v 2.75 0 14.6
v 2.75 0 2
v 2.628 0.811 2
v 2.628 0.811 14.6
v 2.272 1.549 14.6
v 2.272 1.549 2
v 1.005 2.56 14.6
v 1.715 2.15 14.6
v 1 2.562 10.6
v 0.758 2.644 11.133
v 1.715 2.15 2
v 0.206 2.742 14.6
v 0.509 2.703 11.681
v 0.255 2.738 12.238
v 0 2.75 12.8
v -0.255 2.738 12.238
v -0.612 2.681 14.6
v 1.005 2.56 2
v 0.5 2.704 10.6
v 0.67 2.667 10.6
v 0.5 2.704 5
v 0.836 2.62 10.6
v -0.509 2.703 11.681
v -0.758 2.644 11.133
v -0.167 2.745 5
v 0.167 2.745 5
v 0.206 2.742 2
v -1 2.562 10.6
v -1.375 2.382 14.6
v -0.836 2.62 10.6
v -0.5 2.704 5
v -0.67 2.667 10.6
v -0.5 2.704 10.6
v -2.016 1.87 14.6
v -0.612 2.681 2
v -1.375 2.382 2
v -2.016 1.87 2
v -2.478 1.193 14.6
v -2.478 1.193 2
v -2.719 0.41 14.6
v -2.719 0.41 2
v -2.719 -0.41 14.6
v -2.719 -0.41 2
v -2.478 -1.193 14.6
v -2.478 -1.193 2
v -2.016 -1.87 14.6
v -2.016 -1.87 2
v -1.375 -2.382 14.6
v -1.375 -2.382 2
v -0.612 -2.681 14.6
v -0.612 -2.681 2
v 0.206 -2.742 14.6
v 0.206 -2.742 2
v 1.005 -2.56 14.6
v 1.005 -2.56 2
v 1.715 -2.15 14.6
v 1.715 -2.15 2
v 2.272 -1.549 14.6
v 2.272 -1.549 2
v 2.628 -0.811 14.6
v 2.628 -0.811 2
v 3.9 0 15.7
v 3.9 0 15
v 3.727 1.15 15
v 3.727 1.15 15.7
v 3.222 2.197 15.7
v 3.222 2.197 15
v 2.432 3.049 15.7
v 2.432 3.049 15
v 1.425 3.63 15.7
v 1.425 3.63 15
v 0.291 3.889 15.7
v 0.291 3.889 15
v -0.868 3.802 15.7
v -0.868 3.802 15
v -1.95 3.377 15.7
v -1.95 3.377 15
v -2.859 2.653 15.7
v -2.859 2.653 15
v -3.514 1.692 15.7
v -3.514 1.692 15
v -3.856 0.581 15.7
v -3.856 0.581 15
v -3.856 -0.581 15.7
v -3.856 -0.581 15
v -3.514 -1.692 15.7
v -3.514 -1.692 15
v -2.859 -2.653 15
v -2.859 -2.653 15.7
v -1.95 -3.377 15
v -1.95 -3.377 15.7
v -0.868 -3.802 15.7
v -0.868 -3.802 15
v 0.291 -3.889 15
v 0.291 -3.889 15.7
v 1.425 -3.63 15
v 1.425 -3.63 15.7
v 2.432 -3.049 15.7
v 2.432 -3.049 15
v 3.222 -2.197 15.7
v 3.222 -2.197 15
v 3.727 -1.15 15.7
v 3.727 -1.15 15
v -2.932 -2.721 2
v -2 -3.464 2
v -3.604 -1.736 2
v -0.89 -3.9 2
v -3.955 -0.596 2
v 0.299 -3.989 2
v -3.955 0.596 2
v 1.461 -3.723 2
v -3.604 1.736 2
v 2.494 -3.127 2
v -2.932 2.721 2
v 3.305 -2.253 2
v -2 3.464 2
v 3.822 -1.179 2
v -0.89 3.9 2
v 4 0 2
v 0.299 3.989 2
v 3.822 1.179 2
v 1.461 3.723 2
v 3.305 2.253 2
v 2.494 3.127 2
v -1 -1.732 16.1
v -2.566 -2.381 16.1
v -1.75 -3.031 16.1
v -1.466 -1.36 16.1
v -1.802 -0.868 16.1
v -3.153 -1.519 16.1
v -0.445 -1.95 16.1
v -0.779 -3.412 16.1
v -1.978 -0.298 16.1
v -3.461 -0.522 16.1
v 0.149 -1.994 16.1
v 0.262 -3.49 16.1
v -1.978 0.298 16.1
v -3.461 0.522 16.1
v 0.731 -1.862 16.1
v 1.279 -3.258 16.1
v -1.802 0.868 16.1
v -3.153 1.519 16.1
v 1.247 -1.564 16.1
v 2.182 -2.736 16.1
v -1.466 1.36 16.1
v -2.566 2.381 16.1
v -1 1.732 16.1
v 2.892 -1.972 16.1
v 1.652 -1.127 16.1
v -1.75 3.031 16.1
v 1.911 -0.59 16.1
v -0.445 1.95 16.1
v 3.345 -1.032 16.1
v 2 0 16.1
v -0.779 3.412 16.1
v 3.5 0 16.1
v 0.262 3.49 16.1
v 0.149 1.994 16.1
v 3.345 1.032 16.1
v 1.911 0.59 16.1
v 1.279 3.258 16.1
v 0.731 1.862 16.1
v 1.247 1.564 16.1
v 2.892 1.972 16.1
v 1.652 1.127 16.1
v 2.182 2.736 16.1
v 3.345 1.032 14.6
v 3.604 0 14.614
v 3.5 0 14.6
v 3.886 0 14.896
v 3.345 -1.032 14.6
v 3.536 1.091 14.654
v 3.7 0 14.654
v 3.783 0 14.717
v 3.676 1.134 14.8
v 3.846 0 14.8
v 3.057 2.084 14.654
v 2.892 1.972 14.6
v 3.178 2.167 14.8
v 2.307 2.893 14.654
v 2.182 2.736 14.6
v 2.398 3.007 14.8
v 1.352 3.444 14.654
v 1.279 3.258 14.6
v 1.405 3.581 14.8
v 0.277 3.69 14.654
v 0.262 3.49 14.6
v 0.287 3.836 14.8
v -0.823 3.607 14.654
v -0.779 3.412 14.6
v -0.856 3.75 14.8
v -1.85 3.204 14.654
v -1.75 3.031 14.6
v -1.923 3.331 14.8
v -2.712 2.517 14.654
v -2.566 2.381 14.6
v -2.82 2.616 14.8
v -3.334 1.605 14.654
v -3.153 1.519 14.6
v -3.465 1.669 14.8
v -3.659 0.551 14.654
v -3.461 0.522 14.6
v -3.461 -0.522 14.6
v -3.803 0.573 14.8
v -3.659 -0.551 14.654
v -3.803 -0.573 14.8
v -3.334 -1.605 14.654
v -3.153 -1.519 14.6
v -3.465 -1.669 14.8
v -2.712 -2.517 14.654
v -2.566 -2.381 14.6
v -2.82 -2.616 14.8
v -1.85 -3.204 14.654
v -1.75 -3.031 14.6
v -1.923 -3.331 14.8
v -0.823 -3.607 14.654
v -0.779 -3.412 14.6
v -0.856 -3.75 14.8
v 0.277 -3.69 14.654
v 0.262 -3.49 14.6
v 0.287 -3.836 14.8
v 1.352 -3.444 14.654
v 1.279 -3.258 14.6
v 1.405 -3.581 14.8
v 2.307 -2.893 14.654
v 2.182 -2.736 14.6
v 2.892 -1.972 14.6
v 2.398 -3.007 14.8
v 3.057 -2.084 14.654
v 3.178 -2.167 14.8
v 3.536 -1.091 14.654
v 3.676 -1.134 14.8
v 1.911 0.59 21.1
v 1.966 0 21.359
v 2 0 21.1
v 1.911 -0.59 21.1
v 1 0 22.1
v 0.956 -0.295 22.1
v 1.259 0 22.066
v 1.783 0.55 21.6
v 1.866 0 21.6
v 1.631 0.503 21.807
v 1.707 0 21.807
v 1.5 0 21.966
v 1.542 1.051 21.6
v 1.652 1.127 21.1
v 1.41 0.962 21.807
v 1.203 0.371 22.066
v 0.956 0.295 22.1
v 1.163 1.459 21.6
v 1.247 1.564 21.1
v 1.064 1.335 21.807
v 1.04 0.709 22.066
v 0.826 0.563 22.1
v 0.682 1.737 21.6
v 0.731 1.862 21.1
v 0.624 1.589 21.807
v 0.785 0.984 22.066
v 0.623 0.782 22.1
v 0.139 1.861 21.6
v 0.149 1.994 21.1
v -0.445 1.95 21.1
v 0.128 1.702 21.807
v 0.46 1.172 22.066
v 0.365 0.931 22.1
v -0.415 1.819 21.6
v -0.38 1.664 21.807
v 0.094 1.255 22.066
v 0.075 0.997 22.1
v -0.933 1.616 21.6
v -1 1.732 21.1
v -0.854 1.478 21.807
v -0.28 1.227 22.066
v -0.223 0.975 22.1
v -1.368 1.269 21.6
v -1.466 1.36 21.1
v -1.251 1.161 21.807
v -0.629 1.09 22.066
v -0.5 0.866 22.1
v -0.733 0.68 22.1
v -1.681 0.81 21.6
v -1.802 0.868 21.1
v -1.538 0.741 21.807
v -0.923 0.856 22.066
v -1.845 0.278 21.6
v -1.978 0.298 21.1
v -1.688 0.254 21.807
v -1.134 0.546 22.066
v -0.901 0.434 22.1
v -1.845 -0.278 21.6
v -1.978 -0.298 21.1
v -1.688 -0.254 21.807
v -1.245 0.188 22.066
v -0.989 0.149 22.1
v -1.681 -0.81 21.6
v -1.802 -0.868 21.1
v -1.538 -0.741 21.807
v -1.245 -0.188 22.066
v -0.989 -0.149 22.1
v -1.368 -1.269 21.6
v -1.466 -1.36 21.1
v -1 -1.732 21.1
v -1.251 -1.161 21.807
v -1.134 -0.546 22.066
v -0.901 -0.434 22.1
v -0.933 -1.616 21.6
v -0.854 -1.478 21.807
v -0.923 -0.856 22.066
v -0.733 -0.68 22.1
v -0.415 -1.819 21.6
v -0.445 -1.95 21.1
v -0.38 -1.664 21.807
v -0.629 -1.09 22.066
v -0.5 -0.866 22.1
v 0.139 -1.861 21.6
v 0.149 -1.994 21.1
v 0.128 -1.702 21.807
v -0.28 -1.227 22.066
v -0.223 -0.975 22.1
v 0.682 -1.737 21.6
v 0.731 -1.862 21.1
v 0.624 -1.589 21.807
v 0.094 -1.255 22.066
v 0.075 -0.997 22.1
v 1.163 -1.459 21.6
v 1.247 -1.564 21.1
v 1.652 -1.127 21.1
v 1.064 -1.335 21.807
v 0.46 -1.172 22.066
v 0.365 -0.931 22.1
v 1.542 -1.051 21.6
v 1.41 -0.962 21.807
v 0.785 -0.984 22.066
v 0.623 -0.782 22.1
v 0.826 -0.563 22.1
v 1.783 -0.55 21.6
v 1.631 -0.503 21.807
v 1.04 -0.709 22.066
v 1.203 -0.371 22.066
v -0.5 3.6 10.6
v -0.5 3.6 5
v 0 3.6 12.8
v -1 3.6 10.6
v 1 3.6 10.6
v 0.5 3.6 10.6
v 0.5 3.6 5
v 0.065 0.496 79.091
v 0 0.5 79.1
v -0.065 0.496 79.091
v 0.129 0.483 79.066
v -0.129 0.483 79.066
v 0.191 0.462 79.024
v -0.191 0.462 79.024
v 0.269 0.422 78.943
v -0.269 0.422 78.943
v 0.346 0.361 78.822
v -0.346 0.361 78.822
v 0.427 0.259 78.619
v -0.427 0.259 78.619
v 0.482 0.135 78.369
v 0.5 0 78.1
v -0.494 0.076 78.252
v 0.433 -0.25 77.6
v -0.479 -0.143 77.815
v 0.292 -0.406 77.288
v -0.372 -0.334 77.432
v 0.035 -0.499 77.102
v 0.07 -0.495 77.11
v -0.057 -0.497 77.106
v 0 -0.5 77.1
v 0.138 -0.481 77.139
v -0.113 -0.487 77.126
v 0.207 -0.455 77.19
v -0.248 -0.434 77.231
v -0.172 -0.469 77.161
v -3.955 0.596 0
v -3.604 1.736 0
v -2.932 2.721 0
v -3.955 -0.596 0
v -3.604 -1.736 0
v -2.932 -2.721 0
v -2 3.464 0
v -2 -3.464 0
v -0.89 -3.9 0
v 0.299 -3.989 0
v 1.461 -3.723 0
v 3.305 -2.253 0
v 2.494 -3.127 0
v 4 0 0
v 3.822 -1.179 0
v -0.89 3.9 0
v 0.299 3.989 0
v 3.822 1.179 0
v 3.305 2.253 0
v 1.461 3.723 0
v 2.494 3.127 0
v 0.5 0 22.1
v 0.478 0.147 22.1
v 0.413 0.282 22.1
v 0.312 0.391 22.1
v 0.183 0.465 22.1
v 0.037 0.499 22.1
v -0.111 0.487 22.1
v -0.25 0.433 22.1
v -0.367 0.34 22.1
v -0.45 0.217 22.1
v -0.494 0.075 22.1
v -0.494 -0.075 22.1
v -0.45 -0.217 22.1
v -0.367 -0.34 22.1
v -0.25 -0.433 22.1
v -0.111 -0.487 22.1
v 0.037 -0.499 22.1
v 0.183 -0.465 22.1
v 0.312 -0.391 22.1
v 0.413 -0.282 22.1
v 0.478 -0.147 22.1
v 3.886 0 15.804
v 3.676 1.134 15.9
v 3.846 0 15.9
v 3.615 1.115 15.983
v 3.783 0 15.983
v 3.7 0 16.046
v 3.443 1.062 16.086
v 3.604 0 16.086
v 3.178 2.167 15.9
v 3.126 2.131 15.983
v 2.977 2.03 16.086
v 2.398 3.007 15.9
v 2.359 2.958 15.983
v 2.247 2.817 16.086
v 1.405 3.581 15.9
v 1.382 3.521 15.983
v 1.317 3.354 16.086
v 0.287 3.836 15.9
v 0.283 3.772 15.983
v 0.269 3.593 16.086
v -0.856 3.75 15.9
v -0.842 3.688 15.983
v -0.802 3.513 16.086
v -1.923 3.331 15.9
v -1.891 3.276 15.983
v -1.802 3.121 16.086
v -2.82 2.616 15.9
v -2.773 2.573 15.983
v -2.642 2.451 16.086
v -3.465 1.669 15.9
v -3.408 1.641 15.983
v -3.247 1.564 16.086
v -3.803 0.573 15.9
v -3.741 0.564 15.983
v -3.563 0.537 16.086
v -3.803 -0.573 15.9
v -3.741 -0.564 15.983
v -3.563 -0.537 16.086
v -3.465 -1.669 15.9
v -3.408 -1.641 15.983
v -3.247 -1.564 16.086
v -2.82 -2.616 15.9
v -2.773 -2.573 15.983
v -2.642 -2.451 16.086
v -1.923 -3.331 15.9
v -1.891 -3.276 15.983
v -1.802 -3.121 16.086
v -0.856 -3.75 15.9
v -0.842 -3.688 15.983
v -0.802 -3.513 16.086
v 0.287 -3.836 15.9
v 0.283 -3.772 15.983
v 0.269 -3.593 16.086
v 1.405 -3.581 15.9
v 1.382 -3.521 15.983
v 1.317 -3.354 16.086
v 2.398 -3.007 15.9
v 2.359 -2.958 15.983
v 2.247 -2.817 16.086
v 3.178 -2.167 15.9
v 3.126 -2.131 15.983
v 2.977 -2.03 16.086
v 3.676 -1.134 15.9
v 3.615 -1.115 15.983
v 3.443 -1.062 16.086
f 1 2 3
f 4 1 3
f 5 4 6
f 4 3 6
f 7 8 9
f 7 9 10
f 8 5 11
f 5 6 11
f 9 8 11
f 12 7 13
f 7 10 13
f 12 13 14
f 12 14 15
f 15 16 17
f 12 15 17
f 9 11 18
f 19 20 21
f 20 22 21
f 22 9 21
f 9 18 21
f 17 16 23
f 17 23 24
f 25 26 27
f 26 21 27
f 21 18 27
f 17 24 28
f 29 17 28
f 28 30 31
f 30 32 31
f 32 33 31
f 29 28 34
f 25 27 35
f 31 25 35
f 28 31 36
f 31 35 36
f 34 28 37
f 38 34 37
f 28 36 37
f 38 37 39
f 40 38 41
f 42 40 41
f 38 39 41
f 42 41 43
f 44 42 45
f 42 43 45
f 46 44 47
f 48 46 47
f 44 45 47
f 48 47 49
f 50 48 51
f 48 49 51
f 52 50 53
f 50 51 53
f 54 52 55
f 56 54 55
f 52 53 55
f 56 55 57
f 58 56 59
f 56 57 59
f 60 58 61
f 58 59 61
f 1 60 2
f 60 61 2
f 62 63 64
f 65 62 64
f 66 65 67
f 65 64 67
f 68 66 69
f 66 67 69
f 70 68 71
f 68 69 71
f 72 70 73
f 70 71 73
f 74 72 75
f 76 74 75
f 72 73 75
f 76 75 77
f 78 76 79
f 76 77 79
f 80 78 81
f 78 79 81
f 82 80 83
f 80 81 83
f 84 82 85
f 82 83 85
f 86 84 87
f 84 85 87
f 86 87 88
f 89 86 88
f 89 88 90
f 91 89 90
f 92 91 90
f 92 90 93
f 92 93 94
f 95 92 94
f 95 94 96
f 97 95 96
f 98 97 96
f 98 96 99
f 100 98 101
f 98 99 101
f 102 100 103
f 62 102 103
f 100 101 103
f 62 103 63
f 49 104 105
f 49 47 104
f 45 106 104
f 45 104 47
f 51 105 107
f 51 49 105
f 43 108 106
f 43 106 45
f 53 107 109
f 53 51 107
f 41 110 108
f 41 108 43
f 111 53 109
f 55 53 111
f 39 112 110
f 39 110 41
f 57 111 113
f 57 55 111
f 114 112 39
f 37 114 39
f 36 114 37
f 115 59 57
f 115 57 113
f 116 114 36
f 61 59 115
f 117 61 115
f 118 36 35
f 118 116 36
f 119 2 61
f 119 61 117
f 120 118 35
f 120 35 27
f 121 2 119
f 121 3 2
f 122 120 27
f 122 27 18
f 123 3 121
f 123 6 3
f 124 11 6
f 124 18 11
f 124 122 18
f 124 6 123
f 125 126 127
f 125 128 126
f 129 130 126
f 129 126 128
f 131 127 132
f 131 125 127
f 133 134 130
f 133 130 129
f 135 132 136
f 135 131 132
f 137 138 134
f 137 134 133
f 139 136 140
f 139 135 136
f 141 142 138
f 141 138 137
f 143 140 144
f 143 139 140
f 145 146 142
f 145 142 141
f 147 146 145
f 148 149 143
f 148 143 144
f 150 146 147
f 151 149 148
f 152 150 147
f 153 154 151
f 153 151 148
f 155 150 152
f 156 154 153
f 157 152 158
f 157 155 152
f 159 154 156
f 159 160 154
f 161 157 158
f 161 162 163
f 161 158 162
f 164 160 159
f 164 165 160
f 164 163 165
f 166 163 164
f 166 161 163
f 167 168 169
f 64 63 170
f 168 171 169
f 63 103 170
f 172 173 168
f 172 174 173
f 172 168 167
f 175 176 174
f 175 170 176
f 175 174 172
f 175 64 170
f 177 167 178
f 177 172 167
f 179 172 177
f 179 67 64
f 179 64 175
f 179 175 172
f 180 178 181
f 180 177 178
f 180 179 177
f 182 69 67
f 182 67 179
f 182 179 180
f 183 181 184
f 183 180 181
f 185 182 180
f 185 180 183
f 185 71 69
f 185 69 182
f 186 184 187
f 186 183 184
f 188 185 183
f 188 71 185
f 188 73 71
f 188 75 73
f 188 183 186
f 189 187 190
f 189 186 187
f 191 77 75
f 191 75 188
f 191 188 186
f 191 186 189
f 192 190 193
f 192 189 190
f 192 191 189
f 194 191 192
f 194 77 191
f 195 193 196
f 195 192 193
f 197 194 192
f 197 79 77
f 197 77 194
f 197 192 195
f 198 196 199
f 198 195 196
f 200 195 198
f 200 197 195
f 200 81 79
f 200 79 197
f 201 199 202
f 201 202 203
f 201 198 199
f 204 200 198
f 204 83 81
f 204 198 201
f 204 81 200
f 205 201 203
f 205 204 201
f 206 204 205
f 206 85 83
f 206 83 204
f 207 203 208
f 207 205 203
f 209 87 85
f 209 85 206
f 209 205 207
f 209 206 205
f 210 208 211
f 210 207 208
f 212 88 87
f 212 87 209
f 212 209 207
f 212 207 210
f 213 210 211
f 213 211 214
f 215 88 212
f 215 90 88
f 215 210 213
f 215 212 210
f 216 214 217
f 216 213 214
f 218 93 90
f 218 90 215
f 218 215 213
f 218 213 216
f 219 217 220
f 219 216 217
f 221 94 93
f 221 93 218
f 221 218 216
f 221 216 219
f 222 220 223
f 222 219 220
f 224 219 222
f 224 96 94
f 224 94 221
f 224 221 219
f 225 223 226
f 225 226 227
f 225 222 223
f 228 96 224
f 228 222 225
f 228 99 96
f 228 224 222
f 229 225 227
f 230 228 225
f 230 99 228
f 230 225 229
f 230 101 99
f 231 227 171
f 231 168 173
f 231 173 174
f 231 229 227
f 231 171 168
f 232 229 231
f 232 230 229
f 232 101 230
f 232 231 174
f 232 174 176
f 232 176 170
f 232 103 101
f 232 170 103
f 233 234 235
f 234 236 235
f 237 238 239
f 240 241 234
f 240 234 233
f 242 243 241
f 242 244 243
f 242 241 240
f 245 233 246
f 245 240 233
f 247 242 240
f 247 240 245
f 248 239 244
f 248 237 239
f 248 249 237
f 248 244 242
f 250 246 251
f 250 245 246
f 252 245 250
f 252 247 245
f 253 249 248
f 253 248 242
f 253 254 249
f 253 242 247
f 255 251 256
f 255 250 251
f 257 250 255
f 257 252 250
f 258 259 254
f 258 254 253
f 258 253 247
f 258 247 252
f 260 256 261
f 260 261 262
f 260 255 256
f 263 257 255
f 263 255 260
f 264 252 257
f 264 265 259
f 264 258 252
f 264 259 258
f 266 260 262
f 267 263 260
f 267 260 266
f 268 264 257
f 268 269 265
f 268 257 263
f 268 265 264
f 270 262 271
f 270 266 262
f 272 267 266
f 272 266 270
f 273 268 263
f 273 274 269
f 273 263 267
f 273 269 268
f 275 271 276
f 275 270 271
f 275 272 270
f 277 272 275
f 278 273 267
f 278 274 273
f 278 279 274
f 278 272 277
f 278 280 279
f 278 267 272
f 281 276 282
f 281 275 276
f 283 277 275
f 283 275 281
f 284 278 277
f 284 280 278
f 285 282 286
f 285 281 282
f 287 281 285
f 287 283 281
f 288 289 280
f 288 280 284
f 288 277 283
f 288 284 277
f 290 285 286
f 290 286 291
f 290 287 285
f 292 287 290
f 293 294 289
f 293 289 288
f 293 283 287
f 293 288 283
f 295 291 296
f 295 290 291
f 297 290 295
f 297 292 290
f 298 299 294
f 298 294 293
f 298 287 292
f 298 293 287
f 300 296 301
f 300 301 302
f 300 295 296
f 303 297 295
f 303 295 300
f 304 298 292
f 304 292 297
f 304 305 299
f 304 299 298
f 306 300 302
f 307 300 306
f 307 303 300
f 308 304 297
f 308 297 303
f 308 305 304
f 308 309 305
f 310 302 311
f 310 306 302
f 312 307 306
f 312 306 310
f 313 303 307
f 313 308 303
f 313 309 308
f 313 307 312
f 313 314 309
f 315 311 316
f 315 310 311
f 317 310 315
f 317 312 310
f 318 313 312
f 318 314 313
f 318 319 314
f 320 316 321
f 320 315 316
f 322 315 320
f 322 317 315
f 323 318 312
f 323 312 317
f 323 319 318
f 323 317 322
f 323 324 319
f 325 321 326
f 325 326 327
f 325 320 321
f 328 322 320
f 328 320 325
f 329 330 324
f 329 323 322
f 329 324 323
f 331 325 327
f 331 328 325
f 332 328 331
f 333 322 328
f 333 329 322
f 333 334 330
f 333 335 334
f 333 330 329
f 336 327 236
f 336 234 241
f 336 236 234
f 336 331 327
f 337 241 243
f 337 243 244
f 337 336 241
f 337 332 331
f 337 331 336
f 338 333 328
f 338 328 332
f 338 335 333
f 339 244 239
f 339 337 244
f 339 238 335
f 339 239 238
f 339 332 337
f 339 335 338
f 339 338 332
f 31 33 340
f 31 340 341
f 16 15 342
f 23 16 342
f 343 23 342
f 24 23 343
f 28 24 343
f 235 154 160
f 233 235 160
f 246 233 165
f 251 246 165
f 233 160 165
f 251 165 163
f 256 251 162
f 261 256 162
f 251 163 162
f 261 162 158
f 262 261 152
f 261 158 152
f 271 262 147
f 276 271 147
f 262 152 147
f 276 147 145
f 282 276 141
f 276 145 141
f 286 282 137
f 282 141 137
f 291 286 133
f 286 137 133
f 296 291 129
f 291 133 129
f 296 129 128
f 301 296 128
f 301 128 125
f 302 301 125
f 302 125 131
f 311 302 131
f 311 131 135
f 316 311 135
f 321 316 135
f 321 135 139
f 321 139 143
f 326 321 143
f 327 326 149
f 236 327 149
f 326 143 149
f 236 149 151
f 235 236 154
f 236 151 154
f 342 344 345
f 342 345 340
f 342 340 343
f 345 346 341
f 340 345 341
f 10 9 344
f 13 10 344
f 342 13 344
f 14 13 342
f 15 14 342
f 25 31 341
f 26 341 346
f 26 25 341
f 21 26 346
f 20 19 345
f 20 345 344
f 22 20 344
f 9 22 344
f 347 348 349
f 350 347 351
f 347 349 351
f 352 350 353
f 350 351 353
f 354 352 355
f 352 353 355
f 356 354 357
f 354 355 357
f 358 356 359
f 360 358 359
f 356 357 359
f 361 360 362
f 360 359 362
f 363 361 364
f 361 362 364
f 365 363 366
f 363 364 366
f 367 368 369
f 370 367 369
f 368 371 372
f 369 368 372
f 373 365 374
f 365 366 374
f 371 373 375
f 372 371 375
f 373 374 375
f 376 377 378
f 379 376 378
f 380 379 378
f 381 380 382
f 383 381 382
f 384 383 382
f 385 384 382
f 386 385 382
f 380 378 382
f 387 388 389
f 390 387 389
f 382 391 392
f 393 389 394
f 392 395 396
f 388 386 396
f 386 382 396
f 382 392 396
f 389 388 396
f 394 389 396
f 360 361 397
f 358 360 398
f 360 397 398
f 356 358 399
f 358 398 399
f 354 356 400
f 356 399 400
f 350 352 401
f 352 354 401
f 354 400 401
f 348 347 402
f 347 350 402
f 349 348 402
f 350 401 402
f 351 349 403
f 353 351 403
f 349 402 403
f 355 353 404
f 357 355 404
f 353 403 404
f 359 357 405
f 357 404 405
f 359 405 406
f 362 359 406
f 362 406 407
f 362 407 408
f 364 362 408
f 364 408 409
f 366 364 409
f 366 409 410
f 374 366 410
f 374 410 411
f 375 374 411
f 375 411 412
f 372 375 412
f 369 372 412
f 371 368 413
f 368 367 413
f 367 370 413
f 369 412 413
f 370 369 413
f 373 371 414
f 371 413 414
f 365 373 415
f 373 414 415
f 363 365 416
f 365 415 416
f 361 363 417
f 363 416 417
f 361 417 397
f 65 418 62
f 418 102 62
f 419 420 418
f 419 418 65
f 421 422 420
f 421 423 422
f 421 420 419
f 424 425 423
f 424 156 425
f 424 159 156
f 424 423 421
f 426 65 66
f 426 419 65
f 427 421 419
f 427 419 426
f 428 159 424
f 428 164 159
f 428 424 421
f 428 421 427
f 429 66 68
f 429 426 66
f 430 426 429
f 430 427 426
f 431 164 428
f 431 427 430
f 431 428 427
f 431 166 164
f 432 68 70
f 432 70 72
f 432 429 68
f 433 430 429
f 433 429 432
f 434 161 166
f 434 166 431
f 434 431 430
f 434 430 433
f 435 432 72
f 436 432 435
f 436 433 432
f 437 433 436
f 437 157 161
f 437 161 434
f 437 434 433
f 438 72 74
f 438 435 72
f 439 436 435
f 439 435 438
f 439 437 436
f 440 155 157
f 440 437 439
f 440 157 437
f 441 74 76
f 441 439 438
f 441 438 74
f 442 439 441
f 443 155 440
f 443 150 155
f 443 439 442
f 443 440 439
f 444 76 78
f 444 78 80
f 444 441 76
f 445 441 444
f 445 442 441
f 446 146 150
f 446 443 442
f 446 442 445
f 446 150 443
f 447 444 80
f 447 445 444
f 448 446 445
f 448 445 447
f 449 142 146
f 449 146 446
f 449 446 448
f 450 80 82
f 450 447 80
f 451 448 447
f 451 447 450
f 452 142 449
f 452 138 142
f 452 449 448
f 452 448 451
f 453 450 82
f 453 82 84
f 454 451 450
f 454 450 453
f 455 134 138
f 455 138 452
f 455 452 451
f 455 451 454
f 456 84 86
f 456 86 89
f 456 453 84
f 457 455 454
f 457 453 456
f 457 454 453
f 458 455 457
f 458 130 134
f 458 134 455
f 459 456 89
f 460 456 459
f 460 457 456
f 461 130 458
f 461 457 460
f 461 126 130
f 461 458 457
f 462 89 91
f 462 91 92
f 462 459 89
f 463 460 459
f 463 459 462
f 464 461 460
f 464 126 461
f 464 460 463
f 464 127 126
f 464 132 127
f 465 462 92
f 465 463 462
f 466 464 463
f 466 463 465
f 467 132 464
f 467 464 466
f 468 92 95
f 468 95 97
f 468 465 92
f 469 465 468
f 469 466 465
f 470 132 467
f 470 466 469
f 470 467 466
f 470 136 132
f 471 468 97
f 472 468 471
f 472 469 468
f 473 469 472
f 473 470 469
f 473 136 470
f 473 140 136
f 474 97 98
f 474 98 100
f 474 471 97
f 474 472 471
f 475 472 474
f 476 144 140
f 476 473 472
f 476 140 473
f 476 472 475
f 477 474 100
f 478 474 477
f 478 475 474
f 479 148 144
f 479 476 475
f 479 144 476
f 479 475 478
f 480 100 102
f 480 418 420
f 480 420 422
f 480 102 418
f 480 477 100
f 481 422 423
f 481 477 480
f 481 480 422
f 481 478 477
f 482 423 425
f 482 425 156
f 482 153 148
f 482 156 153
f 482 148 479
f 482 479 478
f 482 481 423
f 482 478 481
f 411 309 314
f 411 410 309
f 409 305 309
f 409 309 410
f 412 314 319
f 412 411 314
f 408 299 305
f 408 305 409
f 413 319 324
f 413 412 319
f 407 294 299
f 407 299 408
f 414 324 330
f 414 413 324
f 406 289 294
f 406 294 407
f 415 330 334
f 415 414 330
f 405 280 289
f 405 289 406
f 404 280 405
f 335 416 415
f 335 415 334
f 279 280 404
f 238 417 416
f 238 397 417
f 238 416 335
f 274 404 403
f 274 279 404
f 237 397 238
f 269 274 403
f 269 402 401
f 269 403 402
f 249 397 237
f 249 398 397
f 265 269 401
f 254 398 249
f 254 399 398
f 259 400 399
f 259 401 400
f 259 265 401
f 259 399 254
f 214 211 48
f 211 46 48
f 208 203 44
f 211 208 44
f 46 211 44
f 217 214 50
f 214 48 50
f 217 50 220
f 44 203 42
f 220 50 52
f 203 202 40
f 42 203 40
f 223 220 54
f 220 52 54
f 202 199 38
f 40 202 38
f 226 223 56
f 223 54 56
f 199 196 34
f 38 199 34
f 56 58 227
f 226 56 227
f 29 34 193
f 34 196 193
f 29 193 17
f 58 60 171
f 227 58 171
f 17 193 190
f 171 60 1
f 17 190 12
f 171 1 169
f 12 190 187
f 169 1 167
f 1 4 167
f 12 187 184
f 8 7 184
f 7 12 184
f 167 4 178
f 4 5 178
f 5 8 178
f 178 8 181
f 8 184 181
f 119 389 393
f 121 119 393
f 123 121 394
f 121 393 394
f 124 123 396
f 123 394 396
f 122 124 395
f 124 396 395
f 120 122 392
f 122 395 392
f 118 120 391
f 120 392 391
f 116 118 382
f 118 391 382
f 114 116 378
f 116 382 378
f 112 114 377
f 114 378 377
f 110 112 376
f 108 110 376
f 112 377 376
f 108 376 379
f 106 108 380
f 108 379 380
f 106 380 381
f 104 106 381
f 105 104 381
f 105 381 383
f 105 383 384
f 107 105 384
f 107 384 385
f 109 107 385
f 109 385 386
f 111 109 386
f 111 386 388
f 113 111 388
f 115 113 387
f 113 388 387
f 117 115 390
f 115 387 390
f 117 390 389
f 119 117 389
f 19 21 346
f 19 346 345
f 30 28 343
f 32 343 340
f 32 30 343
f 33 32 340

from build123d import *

# Parameters (mm, degrees)
SKETCH1_R               = 4
BOSS_EXTRUDE1_DEPTH     = 2
SKETCH2_R               = 2.75
BOSS_EXTRUDE2_DEPTH     = 12.6
SKETCH3_R               = 3.9
BOSS_EXTRUDE3_DEPTH     = 1.5
SKETCH4_R               = 2
BOSS_EXTRUDE4_DEPTH     = 6
FILLET1_R               = 1
BOSS_EXTRUDE5_DEPTH     = 3.6
SKETCH6_R               = 0.5
BOSS_EXTRUDE6_DEPTH     = 57
CUT_EXTRUDE1_DEPTH      = 5
CUT_EXTRUDE1_DEPTH_BACK = 5
FILLET2_R               = 0.4


with BuildPart() as part:
    # Sketch1 → Boss-Extrude1 (new body)
    with BuildSketch(Plane.XY):
        Circle(SKETCH1_R)
    extrude(amount=BOSS_EXTRUDE1_DEPTH)

    # Sketch2 → Boss-Extrude2 (add)
    with BuildSketch(Plane.XY.offset(2)):
        Circle(SKETCH2_R)
    extrude(amount=BOSS_EXTRUDE2_DEPTH)

    # Sketch3 → Boss-Extrude3 (add)
    with BuildSketch(Plane.XY.offset(14.6)):
        Circle(SKETCH3_R)
    extrude(amount=BOSS_EXTRUDE3_DEPTH)

    # Sketch4 → Boss-Extrude4 (add)
    with BuildSketch(Plane.XY.offset(16.1)):
        Circle(SKETCH4_R)
    extrude(amount=BOSS_EXTRUDE4_DEPTH)

    # Fillet1
    fillet1_edges = [part.edges().sort_by_distance(p)[0] for p in [
        (-2, 0, 22.1),
    ]]
    fillet(fillet1_edges, radius=FILLET1_R)

    # Sketch5 → Boss-Extrude5 (add)
    with BuildSketch(Plane(origin=(0, 0, 0), x_dir=(1, 0, 0), z_dir=(0, 1, 0))):
        Polygon((-0.5, -5), (0.5, -5), (0.5, -10.6), (1, -10.6), (0, -12.8), (-1, -10.6), (-0.5, -10.6), align=None)
    extrude(amount=BOSS_EXTRUDE5_DEPTH)

    # Sketch6 → Boss-Extrude6 (add)
    with BuildSketch(Plane.XY.offset(22.1)):
        Circle(SKETCH6_R)
    extrude(amount=BOSS_EXTRUDE6_DEPTH)

    # Sketch7 → Cut-Extrude1 (cut, two sides)
    with BuildSketch(Plane(origin=(0, 0, 0), x_dir=(0, 0, -1), z_dir=(1, 0, 0))) as cut_extrude1_sk:
        Polygon((-79.1, 0.5), (-77.1, -0.5), (-79.1, -0.5), align=None)
    extrude(amount=CUT_EXTRUDE1_DEPTH, mode=Mode.SUBTRACT)
    extrude(cut_extrude1_sk.sketch, amount=-CUT_EXTRUDE1_DEPTH_BACK, mode=Mode.SUBTRACT)

    # Fillet2
    fillet2_edges = [part.edges().sort_by_distance(p)[0] for p in [
        (-3.9, 0, 14.6),
        (-3.9, 0, 16.1),
    ]]
    fillet(fillet2_edges, radius=FILLET2_R)


solid = part.part
